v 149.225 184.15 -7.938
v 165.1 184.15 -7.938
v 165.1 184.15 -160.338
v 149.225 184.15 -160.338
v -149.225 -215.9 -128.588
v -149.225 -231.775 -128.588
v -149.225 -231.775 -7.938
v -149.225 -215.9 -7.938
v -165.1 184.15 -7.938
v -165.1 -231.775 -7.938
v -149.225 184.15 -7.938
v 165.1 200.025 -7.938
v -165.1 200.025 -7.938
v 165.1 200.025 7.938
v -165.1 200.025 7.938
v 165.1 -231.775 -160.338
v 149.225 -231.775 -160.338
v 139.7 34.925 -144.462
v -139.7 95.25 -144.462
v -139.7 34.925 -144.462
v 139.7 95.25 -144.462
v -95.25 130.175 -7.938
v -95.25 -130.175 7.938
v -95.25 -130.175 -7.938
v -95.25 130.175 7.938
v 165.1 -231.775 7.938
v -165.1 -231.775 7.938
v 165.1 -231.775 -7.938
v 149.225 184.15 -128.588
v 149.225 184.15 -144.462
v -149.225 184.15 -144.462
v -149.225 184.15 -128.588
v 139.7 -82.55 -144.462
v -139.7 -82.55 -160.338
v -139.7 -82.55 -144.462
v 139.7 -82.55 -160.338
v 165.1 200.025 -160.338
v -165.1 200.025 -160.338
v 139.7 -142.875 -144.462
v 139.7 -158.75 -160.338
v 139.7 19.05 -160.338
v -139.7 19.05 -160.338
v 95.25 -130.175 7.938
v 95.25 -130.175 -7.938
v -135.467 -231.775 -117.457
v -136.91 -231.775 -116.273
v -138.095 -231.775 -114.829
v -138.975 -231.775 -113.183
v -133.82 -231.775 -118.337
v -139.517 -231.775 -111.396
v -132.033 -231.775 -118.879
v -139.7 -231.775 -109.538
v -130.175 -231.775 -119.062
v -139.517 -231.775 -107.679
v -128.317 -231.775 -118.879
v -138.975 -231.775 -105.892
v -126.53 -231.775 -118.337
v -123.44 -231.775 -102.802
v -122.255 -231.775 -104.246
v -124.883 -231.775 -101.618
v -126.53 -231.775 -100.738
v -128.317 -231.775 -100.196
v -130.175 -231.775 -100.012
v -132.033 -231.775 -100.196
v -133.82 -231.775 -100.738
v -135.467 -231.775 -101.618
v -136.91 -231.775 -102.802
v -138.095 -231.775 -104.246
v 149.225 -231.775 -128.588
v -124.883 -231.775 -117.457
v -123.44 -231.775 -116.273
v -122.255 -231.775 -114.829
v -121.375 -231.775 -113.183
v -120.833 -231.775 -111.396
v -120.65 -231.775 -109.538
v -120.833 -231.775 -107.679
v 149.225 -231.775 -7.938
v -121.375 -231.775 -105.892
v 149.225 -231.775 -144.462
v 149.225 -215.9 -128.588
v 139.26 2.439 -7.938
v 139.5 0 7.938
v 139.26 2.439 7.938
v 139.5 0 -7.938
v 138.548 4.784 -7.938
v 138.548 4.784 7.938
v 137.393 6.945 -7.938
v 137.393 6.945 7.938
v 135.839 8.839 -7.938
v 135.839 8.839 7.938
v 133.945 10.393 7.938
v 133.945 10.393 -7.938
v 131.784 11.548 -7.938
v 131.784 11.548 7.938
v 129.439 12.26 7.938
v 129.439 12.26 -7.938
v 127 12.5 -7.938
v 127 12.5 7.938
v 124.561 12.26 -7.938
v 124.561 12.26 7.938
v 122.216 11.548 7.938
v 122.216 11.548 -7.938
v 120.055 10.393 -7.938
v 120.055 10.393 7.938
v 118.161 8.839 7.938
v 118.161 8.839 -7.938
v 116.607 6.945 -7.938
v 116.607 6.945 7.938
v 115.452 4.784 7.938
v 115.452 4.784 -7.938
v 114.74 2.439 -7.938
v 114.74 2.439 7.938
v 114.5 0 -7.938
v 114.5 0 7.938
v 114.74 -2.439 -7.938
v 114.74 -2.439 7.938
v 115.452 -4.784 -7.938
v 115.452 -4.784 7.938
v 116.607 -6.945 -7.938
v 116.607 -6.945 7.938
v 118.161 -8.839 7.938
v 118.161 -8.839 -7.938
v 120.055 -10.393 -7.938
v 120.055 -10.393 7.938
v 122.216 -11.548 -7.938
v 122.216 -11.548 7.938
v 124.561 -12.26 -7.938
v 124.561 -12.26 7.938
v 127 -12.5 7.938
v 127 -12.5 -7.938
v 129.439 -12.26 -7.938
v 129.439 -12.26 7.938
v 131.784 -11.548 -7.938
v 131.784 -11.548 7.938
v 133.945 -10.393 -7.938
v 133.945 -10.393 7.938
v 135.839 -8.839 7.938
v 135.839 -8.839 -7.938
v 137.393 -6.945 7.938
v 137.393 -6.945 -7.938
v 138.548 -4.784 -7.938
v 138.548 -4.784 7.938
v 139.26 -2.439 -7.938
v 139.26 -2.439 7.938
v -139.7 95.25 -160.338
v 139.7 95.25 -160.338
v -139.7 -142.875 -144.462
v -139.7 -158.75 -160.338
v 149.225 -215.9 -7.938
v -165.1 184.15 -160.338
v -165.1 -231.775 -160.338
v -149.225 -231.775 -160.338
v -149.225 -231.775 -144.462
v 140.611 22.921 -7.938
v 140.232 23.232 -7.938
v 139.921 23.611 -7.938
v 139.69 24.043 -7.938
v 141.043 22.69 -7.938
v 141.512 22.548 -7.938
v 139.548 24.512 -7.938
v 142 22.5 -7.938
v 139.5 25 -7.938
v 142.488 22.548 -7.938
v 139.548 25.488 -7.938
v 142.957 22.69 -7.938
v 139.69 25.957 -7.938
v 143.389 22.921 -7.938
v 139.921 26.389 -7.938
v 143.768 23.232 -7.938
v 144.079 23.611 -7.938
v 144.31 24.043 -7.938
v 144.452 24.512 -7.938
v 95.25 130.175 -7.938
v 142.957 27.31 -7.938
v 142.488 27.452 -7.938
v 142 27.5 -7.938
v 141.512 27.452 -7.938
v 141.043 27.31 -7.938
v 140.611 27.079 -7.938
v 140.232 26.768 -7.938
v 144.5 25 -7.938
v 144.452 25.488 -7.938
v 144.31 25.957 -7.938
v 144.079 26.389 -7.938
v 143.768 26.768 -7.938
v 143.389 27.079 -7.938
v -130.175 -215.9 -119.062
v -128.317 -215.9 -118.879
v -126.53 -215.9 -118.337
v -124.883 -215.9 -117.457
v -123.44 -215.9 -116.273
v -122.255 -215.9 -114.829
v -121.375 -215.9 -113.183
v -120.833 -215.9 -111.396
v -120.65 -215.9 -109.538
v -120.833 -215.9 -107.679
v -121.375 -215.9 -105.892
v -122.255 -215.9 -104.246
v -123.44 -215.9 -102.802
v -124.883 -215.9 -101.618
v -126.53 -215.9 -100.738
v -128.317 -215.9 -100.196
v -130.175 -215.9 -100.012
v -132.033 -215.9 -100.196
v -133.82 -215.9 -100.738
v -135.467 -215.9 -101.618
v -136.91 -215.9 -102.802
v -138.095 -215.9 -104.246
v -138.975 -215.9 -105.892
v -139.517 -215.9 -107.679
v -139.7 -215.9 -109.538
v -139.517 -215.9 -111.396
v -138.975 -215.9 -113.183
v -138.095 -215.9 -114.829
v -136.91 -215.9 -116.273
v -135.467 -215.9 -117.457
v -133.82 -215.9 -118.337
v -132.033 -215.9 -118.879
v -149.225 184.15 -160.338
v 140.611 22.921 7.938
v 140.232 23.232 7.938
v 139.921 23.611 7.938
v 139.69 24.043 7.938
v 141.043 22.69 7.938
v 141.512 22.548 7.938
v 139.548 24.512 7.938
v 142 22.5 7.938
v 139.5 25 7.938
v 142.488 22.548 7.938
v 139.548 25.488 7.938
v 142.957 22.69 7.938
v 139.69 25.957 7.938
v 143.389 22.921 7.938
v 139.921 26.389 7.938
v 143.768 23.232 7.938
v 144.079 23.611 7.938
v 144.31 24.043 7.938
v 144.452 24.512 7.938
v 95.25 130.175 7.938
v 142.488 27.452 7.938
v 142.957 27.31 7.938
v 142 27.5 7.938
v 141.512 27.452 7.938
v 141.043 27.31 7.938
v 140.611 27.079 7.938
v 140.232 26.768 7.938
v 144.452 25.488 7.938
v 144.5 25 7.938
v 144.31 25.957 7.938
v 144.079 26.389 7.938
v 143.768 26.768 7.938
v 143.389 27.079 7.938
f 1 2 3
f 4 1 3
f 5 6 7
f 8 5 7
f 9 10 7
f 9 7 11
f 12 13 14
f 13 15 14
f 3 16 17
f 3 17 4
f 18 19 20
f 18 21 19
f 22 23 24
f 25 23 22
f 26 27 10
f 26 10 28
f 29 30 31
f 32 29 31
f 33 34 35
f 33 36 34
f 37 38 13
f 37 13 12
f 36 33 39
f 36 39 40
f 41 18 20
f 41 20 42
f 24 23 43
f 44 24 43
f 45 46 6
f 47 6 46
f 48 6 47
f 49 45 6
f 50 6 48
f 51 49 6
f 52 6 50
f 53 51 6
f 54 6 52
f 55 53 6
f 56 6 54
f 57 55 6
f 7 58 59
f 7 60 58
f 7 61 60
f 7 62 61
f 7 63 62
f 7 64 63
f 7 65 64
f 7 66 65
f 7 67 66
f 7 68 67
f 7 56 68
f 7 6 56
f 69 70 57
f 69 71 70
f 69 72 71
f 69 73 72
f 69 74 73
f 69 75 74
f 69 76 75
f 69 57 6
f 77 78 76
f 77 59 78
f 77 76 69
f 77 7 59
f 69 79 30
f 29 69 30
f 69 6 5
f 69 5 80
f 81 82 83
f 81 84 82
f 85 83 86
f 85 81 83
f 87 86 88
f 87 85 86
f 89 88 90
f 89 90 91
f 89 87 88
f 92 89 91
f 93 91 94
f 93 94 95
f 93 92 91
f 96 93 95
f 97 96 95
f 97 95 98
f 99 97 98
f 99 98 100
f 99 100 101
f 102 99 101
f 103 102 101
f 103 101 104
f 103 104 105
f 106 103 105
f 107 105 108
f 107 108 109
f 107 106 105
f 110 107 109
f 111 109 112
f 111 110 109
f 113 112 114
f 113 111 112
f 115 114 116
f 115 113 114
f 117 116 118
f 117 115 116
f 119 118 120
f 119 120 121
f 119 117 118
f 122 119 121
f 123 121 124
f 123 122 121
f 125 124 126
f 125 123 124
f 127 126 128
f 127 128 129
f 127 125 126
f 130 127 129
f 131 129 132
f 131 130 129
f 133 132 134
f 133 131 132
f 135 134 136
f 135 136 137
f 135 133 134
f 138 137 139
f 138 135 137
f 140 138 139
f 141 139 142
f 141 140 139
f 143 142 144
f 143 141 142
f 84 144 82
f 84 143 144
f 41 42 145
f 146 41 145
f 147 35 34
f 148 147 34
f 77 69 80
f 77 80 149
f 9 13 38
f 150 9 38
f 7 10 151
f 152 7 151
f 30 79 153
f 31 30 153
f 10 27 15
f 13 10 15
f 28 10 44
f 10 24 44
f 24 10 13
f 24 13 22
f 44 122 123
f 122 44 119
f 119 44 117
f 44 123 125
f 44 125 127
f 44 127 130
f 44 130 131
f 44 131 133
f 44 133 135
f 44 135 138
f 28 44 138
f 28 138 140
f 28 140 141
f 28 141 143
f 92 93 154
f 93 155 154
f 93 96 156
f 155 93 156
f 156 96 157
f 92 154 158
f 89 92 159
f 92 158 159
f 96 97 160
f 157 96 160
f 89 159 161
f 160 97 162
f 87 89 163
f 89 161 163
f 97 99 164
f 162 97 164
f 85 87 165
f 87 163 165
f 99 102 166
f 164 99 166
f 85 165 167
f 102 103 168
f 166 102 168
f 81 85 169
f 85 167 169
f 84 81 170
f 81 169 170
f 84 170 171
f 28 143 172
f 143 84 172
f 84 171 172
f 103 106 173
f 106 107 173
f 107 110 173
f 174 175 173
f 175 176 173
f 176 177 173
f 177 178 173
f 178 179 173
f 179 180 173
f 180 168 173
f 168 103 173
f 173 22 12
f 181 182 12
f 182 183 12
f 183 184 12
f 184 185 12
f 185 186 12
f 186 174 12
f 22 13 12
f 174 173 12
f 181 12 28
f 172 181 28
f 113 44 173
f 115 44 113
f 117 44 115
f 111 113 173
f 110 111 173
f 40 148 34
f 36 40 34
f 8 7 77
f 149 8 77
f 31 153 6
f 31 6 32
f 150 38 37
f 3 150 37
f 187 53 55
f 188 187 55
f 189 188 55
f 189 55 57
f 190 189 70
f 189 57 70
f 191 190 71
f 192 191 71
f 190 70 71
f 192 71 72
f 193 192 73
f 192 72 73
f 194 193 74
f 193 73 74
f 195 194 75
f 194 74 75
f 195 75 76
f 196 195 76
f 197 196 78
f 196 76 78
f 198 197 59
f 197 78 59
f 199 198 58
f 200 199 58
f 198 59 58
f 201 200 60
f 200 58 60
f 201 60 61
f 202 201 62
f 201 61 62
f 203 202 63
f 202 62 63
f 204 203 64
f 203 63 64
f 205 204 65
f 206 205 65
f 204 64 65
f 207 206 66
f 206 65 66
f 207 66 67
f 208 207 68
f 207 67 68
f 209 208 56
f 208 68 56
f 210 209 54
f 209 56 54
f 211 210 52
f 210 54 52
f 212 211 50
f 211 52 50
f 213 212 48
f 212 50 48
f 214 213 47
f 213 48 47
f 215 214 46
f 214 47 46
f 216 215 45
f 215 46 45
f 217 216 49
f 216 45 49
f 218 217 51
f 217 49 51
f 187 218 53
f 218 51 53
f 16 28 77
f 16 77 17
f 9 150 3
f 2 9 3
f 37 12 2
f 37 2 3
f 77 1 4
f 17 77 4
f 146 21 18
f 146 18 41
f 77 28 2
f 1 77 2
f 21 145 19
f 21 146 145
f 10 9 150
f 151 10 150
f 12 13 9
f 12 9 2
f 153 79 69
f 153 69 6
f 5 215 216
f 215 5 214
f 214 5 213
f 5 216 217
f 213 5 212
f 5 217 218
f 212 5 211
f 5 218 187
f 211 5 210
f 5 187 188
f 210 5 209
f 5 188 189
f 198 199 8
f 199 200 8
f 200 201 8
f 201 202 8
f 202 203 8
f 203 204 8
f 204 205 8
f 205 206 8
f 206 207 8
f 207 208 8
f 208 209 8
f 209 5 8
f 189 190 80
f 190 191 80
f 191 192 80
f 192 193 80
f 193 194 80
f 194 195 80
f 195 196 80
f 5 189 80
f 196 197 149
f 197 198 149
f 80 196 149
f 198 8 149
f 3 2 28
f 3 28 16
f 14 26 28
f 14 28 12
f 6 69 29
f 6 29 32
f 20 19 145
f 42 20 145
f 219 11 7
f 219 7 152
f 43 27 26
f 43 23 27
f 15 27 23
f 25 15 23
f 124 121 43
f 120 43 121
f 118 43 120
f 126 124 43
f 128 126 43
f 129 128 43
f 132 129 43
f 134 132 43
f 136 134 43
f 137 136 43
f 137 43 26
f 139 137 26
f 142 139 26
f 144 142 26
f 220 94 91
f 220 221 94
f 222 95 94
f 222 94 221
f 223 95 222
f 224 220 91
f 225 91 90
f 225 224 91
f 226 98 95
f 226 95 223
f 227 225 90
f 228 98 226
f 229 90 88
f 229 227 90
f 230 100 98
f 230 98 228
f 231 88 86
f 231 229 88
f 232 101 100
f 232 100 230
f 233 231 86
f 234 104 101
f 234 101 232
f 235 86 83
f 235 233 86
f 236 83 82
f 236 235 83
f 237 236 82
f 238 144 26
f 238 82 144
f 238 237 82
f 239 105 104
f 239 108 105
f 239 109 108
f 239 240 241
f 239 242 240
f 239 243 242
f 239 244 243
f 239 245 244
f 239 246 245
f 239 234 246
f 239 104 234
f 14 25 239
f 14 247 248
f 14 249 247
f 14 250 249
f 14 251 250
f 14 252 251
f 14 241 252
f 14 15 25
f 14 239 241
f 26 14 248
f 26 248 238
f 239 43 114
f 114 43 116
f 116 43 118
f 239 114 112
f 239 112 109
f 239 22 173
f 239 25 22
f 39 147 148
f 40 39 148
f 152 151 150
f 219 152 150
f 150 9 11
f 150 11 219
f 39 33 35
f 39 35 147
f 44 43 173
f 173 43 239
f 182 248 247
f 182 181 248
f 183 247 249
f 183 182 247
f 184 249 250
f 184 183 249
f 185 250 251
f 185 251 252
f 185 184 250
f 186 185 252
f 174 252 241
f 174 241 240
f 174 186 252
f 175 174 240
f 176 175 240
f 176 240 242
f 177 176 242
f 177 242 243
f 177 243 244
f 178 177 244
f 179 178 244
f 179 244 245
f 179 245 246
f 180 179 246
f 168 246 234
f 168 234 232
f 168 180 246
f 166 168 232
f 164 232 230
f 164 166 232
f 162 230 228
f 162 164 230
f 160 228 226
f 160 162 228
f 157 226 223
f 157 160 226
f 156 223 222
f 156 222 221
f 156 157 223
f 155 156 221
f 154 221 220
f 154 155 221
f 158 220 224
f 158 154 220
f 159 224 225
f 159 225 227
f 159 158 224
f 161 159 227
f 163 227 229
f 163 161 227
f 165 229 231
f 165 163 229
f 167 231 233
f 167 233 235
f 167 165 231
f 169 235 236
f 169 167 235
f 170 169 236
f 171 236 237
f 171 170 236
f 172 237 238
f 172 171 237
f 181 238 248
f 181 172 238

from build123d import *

# Parameters (mm, degrees)
SKETCH1_W             = 330.2
SKETCH1_H             = 431.8
SKETCH1_R             = 12.5
SKETCH1_R_2           = 2.5
SKETCH1_W_2           = 190.5
SKETCH1_H_2           = 260.35
BOSS_EXTRUDE1_DEPTH   = 7.9375
SKETCH3_W             = 152.4
SKETCH3_H             = 415.925
BOSS_EXTRUDE2_DEPTH   = 15.875
BOSS_EXTRUDE6_START   = -15.875
SKETCH8_W             = 298.45
SKETCH8_H             = 415.925
BOSS_EXTRUDE6_DEPTH   = 15.875
SKETCH11_W            = 298.45
SKETCH11_H            = 120.65
SKETCH11_R            = 9.525
BOSS_EXTRUDE7_DEPTH   = 15.875
SKETCH14_W            = 330.2
SKETCH14_H            = 152.4
BOSS_EXTRUDE8_DEPTH   = 15.875
BOSS_EXTRUDE5_DEPTH   = 139.7
BOSS_EXTRUDE5_2_DEPTH = 139.7


with BuildPart() as part:
    # Sketch1 → Boss-Extrude1 (new, symmetric)
    with BuildSketch(Plane.XY):
        with Locations((0, -15.875)):
            Rectangle(SKETCH1_W, SKETCH1_H)
        with Locations((127, 0)):
            Circle(SKETCH1_R, mode=Mode.SUBTRACT)
        with Locations((142, 25)):
            Circle(SKETCH1_R_2, mode=Mode.SUBTRACT)
        Rectangle(SKETCH1_W_2, SKETCH1_H_2, mode=Mode.SUBTRACT)
    extrude(amount=BOSS_EXTRUDE1_DEPTH, both=True)


with BuildPart() as body_2:
    # Sketch3 → Boss-Extrude2 (new body)
    with BuildSketch(Plane(origin=(165.1, 0, 0), x_dir=(0, 0, -1), z_dir=(1, 0, 0))):
        with Locations((84.1375, -23.8125)):
            Rectangle(SKETCH3_W, SKETCH3_H)
    extrude(amount=-BOSS_EXTRUDE2_DEPTH)


with BuildPart() as body_3:
    # Mirror1: mirrored copy
    add(body_2.part.mirror(Plane(origin=(0, 0, 0), x_dir=(0, 0, 1), z_dir=(1, 0, 0))))


with BuildPart() as body_4:
    # Sketch8 → Boss-Extrude6 (new body)
    with BuildSketch(Plane(origin=(0, 0, -160.3375), x_dir=(-1, 0, 0), z_dir=(0, 0, -1)).offset(BOSS_EXTRUDE6_START)):
        with Locations((0, -23.8125)):
            Rectangle(SKETCH8_W, SKETCH8_H)
    extrude(amount=-BOSS_EXTRUDE6_DEPTH)


with BuildPart() as body_5:
    # Sketch11 → Boss-Extrude7 (new body)
    with BuildSketch(Plane.XZ.offset(231.775)):
        with Locations((0, -68.2625)):
            Rectangle(SKETCH11_W, SKETCH11_H)
        with Locations(Location((-130.175, -109.5375, 0), (0, 0, 270))):
            Circle(SKETCH11_R, mode=Mode.SUBTRACT)
    extrude(amount=-BOSS_EXTRUDE7_DEPTH)


with BuildPart() as body_6:
    # Sketch14 → Boss-Extrude8 (new body)
    with BuildSketch(Plane(origin=(0, 200.025, 0), x_dir=(1, 0, 0), z_dir=(0, 1, 0))):
        with Locations((0, 84.1375)):
            Rectangle(SKETCH14_W, SKETCH14_H)
    extrude(amount=-BOSS_EXTRUDE8_DEPTH)


with BuildPart() as body_7:
    # Sketch7 → Boss-Extrude5 (new, symmetric)
    with BuildSketch(Plane(origin=(0, 0, 0), x_dir=(0, 0, -1), z_dir=(1, 0, 0))):
        Polygon((144.4625, 95.25), (144.4625, 34.925), (160.3375, 19.05), (160.3375, 95.25), align=None)
    extrude(amount=BOSS_EXTRUDE5_DEPTH, both=True)


with BuildPart() as body_8:
    # Sketch7 → Boss-Extrude5 2 (new, symmetric)
    with BuildSketch(Plane(origin=(0, 0, 0), x_dir=(0, 0, -1), z_dir=(1, 0, 0))):
        Polygon((160.3375, -82.55), (144.4625, -82.55), (144.4625, -142.875), (160.3375, -158.75), align=None)
    extrude(amount=BOSS_EXTRUDE5_2_DEPTH, both=True)


solid = Compound([part.part, body_2.part, body_3.part, body_4.part, body_5.part, body_6.part, body_7.part, body_8.part])
